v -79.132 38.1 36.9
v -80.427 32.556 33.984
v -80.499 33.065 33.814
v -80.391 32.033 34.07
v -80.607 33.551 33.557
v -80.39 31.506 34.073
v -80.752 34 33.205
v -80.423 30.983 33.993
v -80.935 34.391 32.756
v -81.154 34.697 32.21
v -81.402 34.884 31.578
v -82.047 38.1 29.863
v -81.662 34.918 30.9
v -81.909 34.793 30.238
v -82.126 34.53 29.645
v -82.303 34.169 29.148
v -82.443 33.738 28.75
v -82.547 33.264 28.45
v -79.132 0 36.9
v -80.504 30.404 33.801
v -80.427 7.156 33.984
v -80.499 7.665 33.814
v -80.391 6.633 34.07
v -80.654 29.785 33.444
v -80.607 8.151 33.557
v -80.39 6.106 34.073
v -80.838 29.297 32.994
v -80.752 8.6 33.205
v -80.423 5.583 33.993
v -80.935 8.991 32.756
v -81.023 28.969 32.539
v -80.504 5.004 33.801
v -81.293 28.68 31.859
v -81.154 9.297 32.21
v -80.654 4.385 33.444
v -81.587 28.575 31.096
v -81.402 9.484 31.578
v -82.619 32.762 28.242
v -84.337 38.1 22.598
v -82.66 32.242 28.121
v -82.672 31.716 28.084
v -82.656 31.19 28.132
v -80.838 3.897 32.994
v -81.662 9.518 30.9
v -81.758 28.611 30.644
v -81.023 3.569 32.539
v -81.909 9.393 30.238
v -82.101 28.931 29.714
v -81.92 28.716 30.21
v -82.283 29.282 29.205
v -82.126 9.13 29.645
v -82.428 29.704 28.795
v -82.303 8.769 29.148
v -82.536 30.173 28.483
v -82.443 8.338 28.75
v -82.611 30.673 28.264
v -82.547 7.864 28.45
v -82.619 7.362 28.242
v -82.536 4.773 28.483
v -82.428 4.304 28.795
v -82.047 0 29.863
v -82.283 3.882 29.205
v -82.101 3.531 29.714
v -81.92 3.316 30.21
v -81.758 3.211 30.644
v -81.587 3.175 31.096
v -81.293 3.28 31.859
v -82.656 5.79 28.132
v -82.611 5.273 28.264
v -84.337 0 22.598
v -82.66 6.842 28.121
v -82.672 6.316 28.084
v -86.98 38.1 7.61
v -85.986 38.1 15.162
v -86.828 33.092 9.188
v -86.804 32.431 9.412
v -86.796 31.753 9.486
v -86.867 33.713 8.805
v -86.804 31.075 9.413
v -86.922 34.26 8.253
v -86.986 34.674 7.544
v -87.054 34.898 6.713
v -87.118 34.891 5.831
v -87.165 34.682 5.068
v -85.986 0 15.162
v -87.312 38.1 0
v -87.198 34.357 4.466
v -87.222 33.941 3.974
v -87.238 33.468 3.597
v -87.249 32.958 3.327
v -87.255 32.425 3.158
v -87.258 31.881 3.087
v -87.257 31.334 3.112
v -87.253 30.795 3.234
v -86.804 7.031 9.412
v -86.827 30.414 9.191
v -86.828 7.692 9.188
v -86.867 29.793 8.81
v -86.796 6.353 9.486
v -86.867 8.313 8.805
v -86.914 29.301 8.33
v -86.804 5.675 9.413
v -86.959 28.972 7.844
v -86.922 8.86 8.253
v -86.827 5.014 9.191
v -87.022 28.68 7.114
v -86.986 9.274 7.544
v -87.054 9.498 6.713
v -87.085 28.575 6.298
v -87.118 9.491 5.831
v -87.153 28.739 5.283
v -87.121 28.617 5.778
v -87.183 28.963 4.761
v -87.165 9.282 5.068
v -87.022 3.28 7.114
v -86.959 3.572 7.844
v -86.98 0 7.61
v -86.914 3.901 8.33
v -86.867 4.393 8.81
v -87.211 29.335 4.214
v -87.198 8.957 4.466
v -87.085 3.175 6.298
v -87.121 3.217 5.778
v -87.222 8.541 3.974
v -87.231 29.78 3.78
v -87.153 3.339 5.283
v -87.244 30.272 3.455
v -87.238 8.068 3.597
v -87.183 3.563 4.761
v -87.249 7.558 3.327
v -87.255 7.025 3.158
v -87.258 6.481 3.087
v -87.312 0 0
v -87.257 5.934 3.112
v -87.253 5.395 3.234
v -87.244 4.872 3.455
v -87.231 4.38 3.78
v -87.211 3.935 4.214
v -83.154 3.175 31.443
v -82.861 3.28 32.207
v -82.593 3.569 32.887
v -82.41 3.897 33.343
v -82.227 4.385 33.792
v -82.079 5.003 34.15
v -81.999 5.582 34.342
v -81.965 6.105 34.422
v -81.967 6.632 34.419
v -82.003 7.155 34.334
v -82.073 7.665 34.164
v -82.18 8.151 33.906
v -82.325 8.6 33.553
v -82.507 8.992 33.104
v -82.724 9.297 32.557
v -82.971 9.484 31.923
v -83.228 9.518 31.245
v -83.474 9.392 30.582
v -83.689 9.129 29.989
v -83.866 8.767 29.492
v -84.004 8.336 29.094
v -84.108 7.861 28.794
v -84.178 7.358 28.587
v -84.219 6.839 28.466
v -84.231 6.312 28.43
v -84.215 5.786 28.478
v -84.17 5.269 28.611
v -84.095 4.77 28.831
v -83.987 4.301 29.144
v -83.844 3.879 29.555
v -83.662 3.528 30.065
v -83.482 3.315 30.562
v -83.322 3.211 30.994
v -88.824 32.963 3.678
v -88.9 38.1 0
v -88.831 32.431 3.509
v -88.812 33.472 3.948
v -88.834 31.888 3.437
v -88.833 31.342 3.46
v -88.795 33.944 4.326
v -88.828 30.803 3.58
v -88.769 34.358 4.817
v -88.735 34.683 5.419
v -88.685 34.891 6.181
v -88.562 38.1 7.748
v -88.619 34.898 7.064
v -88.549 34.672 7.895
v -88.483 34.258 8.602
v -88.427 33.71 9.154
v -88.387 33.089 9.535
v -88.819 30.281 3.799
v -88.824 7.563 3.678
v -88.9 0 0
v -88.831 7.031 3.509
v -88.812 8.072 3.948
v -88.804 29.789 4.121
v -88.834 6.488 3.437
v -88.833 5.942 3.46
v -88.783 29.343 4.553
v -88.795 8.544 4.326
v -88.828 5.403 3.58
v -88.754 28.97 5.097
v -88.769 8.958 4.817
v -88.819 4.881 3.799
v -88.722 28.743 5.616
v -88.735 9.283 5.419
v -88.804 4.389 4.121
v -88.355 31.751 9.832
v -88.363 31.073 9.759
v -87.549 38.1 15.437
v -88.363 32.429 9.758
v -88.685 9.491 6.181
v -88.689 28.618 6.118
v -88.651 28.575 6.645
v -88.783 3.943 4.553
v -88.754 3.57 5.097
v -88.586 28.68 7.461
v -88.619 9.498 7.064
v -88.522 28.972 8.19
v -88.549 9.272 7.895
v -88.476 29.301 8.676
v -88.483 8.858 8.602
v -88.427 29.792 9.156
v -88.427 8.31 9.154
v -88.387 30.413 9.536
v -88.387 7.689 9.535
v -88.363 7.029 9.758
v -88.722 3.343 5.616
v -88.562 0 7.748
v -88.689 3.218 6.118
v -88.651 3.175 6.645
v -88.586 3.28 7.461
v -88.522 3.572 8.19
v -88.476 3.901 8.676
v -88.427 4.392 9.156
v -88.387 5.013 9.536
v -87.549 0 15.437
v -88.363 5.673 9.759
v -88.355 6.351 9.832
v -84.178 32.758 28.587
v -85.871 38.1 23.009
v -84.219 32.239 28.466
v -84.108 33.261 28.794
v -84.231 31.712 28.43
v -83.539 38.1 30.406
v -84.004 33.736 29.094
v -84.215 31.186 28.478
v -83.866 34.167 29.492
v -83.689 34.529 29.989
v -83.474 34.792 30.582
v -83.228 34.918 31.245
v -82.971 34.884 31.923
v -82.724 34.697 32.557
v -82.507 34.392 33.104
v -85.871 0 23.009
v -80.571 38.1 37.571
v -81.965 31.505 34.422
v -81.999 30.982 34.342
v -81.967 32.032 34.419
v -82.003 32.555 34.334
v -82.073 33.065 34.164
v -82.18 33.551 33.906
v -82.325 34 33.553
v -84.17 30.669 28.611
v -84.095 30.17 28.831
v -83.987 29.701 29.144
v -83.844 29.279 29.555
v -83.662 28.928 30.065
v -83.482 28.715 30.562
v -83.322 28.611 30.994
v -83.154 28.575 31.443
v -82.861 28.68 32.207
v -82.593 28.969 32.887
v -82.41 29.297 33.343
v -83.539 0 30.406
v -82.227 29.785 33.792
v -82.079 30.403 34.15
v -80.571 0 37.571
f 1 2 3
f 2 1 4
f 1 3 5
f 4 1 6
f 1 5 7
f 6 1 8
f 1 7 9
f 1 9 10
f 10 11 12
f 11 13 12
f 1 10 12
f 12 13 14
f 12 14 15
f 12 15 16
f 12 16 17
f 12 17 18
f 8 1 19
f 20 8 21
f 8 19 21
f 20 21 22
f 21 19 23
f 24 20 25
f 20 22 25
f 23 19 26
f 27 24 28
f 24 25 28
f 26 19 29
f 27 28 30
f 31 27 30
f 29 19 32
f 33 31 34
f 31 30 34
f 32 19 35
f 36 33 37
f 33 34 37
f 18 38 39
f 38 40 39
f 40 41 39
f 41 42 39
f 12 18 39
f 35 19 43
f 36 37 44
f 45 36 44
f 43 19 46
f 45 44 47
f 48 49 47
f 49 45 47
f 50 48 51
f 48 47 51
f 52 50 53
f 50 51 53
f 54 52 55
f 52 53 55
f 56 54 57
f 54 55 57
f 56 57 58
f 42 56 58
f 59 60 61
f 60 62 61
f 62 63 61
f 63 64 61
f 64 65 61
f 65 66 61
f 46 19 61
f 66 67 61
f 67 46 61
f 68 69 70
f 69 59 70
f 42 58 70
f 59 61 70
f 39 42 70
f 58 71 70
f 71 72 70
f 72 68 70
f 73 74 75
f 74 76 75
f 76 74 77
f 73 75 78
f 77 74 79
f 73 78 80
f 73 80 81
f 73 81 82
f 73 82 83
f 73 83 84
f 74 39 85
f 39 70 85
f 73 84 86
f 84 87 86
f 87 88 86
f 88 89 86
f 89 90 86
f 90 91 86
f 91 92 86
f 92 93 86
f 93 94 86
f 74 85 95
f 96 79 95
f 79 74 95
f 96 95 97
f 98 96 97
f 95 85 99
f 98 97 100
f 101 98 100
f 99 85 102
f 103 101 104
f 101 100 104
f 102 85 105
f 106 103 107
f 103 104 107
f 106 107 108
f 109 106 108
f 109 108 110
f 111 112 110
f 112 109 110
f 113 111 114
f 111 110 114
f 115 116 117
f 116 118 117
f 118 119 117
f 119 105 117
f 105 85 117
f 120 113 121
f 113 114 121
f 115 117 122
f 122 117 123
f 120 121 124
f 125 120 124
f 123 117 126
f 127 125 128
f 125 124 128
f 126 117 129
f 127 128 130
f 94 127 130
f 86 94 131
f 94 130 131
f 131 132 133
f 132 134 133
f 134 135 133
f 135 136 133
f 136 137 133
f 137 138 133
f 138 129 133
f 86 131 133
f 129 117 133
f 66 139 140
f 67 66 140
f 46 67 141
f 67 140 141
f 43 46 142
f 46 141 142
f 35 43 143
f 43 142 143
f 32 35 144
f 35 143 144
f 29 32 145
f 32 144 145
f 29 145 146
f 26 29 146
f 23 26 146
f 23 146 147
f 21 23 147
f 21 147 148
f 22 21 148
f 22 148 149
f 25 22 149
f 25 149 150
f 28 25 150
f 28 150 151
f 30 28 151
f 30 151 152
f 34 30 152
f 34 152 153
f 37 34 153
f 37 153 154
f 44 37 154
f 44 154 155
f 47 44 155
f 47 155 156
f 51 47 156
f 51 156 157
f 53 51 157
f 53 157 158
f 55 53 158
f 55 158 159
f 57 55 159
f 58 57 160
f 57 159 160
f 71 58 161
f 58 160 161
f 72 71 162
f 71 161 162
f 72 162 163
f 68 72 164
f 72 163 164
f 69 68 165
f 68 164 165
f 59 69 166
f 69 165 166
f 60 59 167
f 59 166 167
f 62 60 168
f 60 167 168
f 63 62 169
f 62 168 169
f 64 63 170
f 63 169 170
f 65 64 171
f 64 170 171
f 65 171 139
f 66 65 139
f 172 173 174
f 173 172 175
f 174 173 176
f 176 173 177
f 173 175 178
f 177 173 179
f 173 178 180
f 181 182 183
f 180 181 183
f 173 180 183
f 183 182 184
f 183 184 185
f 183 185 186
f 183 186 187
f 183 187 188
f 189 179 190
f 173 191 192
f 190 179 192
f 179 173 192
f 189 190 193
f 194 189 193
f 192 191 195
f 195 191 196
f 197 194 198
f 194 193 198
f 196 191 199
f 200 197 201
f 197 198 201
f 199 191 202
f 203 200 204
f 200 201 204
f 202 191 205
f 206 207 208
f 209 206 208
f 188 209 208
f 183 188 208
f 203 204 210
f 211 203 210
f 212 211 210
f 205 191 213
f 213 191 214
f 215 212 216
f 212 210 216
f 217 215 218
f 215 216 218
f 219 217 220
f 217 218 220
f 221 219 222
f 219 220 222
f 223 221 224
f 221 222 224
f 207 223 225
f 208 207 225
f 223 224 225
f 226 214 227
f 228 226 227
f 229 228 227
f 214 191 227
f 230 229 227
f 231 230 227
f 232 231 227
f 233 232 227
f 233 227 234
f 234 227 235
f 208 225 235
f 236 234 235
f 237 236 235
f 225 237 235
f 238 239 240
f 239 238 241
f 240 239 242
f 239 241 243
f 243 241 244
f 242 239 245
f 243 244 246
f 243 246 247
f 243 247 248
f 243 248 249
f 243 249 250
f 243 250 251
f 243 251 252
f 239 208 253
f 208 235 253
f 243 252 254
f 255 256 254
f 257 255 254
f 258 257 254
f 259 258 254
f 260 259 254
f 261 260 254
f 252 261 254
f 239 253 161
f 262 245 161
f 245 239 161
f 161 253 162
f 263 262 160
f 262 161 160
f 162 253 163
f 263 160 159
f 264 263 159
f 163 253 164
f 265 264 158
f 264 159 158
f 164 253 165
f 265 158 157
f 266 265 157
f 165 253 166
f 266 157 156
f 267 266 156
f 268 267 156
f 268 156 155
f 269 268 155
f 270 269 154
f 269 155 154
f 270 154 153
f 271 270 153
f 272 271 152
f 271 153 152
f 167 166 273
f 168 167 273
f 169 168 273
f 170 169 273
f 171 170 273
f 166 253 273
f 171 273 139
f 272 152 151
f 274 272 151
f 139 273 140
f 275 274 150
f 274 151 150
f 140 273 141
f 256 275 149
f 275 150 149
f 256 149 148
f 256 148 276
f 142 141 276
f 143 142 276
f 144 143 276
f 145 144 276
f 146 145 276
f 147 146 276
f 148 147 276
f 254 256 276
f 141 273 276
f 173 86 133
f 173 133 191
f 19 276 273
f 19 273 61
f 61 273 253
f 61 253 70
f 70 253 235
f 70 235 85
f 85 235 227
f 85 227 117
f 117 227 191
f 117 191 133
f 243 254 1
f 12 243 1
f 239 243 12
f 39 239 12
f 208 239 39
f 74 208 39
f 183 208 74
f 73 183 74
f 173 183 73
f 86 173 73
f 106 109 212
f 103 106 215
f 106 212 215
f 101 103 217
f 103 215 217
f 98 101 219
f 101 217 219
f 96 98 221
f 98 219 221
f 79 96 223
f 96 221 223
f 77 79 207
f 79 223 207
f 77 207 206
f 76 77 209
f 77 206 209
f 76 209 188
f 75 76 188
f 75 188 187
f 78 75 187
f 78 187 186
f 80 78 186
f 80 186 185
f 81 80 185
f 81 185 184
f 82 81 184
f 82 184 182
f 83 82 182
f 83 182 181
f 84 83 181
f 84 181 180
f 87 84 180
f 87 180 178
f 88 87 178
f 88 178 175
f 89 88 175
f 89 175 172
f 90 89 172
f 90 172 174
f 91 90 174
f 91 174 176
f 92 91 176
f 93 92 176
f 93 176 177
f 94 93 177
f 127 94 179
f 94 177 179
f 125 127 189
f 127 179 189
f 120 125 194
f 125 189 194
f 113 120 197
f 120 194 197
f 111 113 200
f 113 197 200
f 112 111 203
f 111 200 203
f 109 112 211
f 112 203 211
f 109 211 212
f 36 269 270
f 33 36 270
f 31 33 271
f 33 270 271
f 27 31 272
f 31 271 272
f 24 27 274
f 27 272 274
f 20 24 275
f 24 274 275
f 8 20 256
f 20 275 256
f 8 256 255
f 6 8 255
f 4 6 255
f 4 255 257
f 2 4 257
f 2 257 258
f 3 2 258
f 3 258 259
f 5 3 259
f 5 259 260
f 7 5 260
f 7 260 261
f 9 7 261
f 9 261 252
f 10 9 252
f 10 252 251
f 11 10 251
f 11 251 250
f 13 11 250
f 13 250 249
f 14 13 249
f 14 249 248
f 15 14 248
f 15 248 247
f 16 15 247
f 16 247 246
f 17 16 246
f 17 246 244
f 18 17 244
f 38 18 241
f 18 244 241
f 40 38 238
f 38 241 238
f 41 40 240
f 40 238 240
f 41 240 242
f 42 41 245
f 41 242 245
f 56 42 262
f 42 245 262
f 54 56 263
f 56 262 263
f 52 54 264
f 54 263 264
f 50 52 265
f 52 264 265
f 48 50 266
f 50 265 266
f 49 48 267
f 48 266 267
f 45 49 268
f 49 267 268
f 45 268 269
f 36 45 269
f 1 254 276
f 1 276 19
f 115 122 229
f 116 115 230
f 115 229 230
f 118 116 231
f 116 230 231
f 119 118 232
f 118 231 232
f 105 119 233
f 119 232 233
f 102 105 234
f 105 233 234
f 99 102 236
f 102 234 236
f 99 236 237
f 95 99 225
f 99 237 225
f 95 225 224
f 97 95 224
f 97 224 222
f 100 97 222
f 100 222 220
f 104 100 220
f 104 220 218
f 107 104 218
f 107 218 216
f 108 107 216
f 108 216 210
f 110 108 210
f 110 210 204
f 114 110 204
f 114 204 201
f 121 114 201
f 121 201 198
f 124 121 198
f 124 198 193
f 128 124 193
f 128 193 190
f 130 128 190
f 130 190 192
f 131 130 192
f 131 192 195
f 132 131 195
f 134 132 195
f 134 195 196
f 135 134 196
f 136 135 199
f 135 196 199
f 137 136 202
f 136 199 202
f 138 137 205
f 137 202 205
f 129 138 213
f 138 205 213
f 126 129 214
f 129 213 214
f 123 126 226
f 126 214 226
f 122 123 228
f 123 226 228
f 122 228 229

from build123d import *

# Parameters (mm, degrees)
BOSS_EXTRUDE1_DEPTH = 38.1
SKETCH3_R           = 3.175
CUT_EXTRUDE1_DEPTH  = 38.1


with BuildPart() as part:
    # Sketch2 → Boss-Extrude1 (new body)
    with BuildSketch(Plane(origin=(0, 0, 0), x_dir=(1, 0, 0), z_dir=(0, 1, 0))):
        with BuildLine():
            ThreePointArc((-79.131998656, -36.899856978), (-85.242845122, -18.897883792), (-87.3125, 0))
            Line((-87.3125, 0), (-88.9, 0))
            ThreePointArc((-88.9, 0), (-86.792715033, -19.241481679), (-80.570762268, -37.570763469))
            Line((-80.570762268, -37.570763469), (-79.131998656, -36.899856978))
        make_face()
    extrude(amount=BOSS_EXTRUDE1_DEPTH)

    # Sketch3 → Cut-Extrude1 (cut)
    with BuildSketch(Plane(origin=(-86.792715033, 0, 19.241481679), x_dir=(0, -1, 0), z_dir=(-0.976296007, 0, 0.216439614))):
        with Locations((-31.75, -12.7)):
            Circle(SKETCH3_R)
        with Locations((-31.75, 12.7)):
            Circle(SKETCH3_R)
        with Locations((-6.35, -12.7)):
            Circle(SKETCH3_R)
        with Locations((-6.35, 12.7)):
            Circle(SKETCH3_R)
    extrude(amount=-CUT_EXTRUDE1_DEPTH, mode=Mode.SUBTRACT)


solid = part.part
